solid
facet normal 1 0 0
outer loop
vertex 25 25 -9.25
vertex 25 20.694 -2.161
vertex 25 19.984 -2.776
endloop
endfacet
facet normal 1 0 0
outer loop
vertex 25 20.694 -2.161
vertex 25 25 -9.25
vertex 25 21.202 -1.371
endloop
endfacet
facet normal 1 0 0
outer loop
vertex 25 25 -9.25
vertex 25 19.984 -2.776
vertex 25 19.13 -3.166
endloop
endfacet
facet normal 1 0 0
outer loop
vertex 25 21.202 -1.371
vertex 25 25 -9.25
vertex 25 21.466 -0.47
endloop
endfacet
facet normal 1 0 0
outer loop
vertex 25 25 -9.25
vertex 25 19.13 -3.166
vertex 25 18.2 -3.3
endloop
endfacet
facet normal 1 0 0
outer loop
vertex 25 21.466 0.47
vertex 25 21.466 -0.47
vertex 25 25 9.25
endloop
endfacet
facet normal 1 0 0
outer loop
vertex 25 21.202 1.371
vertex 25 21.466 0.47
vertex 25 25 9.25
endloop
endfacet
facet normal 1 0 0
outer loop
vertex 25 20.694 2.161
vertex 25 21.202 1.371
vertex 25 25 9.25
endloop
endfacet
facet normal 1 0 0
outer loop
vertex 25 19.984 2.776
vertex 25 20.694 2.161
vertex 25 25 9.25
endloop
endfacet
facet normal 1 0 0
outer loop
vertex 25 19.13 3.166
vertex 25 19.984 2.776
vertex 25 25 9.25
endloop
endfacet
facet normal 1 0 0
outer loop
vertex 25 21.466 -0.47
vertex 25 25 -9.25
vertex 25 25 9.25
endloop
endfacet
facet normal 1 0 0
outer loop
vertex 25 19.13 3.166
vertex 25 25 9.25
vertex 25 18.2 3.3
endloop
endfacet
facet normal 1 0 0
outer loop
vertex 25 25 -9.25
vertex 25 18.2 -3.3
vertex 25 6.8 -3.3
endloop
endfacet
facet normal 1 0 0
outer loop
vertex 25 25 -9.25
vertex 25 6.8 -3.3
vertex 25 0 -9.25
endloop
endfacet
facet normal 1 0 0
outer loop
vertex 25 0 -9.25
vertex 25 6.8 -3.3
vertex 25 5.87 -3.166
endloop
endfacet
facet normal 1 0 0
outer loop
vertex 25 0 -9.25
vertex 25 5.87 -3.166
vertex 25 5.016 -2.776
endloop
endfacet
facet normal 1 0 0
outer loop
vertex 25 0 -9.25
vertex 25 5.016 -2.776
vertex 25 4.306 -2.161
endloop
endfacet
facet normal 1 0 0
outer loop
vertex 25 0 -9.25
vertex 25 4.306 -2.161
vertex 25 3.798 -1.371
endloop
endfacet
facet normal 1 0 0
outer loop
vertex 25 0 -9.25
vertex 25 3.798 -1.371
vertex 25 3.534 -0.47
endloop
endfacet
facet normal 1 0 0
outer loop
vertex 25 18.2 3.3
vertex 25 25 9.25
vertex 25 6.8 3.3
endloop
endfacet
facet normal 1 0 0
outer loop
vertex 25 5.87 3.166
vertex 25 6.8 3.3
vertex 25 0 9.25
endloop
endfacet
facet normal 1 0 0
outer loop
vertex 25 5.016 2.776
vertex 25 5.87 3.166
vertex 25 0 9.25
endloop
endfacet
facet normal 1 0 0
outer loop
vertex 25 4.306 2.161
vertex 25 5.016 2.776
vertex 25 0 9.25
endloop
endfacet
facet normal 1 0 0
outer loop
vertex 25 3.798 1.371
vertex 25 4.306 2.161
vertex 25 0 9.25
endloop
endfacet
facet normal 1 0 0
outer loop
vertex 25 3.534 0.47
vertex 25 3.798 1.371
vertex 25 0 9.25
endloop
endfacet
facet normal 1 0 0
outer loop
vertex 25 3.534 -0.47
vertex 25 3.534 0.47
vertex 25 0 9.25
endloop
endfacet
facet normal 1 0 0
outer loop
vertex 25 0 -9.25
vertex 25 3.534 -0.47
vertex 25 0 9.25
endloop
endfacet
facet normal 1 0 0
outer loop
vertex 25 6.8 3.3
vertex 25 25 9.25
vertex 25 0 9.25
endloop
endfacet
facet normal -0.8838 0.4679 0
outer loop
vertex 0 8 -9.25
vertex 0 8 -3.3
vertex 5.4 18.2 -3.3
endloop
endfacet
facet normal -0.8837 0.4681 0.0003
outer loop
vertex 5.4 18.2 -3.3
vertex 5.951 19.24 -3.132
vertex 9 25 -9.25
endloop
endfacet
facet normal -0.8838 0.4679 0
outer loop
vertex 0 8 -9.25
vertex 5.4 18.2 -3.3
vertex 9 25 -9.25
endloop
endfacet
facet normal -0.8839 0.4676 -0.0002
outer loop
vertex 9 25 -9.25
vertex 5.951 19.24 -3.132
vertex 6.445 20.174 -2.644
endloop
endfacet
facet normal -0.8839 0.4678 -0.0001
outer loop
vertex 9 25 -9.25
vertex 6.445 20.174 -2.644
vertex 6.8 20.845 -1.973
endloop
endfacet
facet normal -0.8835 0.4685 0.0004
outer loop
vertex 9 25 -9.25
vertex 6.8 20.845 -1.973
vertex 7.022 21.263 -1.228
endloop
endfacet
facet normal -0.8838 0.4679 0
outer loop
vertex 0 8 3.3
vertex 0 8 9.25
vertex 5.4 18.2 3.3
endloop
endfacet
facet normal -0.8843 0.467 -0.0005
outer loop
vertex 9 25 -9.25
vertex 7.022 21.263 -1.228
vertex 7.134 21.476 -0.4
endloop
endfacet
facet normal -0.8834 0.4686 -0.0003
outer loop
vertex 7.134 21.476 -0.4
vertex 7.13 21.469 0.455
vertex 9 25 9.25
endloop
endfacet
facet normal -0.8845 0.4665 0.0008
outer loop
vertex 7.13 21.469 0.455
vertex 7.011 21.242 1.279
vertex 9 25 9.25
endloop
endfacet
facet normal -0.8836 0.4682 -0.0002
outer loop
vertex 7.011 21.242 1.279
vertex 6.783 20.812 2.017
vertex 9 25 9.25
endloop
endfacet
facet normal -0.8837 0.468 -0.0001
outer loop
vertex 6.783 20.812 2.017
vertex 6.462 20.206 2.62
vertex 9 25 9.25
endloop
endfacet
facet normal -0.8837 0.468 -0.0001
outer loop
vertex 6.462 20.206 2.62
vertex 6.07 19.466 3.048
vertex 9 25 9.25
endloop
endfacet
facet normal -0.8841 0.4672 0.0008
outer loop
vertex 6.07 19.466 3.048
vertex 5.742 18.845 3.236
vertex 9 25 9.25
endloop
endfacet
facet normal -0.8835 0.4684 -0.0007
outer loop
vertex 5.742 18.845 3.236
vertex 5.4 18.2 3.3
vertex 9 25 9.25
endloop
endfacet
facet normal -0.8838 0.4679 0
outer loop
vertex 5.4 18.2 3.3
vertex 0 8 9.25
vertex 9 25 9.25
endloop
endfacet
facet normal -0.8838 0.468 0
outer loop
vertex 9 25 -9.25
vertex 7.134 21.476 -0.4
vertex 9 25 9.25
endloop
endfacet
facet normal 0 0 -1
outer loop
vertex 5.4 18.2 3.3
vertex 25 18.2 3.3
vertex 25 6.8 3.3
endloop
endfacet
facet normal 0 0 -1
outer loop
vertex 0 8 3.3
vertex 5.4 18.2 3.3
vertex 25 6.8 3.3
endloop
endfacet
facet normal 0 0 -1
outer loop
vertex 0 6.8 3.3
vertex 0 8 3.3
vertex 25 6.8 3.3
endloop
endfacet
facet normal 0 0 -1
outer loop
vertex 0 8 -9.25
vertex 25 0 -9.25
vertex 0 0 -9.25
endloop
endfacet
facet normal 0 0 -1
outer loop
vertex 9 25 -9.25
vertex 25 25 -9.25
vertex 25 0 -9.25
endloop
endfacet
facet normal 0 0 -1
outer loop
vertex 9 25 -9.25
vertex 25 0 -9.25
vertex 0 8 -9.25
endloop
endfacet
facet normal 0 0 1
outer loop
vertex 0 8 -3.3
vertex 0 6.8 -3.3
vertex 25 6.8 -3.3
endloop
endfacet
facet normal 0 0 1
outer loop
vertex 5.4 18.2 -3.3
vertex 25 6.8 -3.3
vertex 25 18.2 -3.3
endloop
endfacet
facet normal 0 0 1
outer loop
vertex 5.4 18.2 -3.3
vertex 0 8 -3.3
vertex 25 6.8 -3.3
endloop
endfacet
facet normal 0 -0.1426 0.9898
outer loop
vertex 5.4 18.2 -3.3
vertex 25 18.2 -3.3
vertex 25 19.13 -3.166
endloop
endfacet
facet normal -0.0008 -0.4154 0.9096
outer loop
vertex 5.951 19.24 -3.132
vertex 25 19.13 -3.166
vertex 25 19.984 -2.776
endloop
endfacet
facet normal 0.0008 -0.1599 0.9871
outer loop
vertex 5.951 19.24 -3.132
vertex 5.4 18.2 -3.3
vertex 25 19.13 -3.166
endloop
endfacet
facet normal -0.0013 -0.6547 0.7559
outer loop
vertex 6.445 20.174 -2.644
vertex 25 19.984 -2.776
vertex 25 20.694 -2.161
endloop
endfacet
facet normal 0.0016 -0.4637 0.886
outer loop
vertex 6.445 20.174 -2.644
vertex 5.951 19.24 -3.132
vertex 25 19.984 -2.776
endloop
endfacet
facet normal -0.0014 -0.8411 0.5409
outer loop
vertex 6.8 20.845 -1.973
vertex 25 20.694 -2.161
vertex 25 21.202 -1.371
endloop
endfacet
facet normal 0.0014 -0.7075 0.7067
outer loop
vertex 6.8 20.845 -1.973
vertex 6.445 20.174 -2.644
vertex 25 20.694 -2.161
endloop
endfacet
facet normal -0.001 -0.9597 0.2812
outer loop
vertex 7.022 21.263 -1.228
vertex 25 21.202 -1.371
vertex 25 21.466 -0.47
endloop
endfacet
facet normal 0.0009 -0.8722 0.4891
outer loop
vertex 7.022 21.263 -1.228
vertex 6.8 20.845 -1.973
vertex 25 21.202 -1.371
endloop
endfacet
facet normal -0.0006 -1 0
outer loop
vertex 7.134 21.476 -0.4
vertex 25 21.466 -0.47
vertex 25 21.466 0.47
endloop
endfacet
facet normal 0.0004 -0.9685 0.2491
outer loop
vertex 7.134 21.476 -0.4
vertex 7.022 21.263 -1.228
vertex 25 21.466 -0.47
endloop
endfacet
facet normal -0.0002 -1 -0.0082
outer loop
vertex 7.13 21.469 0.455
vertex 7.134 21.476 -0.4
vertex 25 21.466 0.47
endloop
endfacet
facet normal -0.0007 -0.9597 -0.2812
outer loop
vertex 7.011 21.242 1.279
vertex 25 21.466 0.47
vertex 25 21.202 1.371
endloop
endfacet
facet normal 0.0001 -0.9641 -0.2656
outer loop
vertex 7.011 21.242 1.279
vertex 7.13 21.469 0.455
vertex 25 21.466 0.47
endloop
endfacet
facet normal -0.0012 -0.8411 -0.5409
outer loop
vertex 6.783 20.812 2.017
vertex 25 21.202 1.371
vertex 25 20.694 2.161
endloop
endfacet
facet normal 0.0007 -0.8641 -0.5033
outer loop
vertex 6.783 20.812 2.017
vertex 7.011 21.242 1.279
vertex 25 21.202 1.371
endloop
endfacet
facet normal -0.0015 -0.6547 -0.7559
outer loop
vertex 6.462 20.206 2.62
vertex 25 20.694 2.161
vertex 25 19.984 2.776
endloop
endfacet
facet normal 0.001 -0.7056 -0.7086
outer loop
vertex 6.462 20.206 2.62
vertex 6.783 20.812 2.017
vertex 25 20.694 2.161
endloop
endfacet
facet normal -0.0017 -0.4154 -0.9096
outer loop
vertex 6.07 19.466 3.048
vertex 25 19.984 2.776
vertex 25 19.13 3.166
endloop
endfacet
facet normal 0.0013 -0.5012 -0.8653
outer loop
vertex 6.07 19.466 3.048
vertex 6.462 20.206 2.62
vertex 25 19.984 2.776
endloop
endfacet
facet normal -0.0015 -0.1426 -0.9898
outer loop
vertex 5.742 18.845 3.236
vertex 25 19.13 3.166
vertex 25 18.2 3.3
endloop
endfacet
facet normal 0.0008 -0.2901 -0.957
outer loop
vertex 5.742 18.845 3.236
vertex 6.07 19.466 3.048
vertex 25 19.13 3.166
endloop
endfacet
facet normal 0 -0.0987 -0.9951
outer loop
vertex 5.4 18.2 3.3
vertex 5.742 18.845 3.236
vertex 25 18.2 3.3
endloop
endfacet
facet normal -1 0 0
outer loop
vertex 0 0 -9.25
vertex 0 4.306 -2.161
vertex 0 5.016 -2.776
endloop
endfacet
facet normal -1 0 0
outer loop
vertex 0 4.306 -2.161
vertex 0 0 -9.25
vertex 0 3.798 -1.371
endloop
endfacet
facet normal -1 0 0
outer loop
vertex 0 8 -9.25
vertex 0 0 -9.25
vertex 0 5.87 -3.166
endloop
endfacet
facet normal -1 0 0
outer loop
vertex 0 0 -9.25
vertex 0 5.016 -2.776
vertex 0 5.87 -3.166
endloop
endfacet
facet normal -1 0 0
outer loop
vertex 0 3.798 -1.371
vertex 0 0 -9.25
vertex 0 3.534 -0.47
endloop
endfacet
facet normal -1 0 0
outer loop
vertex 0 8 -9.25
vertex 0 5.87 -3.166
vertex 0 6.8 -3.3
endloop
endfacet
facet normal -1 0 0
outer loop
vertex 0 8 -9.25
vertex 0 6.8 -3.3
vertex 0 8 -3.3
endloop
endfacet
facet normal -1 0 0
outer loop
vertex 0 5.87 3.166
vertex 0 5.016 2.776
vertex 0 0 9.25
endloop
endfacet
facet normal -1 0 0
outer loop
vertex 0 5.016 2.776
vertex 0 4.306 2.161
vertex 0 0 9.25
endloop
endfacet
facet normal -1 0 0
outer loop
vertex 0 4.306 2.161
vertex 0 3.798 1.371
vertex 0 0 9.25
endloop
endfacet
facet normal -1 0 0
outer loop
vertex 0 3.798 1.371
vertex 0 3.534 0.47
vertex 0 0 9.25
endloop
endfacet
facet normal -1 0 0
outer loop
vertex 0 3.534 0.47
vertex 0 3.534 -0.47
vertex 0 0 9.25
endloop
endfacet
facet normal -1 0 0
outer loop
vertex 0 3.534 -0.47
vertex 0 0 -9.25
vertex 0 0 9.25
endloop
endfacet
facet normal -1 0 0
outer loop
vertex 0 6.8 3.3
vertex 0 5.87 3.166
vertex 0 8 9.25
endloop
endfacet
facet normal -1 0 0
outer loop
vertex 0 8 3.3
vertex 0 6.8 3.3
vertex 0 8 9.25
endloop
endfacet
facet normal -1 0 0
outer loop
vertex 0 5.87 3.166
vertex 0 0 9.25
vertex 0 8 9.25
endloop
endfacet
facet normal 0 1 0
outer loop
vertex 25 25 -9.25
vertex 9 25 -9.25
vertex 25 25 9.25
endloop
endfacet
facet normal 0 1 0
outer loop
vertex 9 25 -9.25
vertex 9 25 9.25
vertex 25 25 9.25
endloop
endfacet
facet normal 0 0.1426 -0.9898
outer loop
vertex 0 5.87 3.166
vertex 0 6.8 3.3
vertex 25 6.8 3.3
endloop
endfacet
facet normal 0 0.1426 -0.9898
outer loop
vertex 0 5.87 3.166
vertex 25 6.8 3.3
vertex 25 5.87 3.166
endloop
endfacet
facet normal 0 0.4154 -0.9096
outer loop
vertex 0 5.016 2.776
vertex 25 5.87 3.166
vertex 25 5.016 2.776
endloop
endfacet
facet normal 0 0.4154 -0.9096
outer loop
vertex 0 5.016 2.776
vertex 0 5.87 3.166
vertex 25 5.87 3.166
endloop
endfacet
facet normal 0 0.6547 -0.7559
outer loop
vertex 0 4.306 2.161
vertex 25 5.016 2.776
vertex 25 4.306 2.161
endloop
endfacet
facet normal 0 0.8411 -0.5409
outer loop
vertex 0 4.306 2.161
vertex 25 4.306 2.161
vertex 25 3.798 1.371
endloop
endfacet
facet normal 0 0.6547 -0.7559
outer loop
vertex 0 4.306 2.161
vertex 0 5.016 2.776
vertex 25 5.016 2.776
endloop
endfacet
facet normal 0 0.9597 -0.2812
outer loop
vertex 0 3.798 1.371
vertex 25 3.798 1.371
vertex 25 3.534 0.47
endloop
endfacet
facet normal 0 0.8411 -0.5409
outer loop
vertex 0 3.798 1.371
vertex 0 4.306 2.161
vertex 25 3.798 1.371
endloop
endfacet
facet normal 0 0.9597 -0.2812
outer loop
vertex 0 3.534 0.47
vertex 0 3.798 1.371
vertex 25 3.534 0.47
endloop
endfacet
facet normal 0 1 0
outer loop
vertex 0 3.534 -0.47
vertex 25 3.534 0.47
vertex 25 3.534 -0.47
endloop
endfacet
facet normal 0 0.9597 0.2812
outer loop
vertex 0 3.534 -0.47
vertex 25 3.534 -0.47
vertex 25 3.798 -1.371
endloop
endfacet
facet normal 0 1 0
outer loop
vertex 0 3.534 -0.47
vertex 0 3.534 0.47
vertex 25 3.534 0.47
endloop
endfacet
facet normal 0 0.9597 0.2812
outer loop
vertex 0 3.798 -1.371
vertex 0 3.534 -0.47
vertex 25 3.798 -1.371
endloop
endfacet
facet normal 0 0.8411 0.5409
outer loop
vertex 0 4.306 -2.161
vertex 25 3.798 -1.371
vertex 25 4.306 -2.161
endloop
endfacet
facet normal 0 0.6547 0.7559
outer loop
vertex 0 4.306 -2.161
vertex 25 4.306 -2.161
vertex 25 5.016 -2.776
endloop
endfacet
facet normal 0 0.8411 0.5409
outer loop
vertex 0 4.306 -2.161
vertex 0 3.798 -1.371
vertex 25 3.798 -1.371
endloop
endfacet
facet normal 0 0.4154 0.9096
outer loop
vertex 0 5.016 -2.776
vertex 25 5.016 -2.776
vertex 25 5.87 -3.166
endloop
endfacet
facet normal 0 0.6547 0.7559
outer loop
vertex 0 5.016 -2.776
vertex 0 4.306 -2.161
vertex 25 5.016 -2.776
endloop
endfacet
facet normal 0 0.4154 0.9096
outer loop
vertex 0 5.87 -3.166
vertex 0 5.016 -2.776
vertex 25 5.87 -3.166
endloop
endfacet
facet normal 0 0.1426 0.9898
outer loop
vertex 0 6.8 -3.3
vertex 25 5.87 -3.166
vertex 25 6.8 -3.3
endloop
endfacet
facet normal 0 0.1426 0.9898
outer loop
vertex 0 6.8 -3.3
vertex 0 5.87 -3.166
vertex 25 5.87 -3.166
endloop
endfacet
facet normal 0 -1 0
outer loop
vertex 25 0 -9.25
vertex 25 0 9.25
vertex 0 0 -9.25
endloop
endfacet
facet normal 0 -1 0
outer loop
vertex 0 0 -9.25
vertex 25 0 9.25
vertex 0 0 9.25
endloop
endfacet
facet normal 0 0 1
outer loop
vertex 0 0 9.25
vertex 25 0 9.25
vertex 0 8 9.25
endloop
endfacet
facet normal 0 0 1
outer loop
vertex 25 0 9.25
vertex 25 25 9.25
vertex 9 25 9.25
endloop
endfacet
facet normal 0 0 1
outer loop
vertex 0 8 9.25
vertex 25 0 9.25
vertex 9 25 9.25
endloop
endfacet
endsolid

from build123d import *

# Parameters (mm, degrees)
BOSS_EXTRUDE2_DEPTH      = 9.25
M6_CLEARANCE_SLOT1_DEPTH = 25


# Read off the part's stored shape, not the designer's step: M6 Clearance Slot1
with BuildPart() as part:
    # Sketch2 → Boss-Extrude2 (new, symmetric)
    with BuildSketch(Plane.XY):
        Polygon((0, 0), (0, 8), (9, 25), (25, 25), (25, 0), align=None)
    extrude(amount=BOSS_EXTRUDE2_DEPTH, both=True)

    # M6 Clearance Slot1 outline → M6 Clearance Slot1 (cut)
    with BuildSketch(Plane.YZ):
        with BuildLine():
            Line((6.8, -3.3), (18.2, -3.3))
            ThreePointArc((18.2, -3.3), (21.5, 0), (18.2, 3.3))
            Line((18.2, 3.3), (6.8, 3.3))
            ThreePointArc((6.8, 3.3), (3.5, 0), (6.8, -3.3))
        make_face()
    extrude(amount=M6_CLEARANCE_SLOT1_DEPTH, mode=Mode.SUBTRACT)


solid = part.part
